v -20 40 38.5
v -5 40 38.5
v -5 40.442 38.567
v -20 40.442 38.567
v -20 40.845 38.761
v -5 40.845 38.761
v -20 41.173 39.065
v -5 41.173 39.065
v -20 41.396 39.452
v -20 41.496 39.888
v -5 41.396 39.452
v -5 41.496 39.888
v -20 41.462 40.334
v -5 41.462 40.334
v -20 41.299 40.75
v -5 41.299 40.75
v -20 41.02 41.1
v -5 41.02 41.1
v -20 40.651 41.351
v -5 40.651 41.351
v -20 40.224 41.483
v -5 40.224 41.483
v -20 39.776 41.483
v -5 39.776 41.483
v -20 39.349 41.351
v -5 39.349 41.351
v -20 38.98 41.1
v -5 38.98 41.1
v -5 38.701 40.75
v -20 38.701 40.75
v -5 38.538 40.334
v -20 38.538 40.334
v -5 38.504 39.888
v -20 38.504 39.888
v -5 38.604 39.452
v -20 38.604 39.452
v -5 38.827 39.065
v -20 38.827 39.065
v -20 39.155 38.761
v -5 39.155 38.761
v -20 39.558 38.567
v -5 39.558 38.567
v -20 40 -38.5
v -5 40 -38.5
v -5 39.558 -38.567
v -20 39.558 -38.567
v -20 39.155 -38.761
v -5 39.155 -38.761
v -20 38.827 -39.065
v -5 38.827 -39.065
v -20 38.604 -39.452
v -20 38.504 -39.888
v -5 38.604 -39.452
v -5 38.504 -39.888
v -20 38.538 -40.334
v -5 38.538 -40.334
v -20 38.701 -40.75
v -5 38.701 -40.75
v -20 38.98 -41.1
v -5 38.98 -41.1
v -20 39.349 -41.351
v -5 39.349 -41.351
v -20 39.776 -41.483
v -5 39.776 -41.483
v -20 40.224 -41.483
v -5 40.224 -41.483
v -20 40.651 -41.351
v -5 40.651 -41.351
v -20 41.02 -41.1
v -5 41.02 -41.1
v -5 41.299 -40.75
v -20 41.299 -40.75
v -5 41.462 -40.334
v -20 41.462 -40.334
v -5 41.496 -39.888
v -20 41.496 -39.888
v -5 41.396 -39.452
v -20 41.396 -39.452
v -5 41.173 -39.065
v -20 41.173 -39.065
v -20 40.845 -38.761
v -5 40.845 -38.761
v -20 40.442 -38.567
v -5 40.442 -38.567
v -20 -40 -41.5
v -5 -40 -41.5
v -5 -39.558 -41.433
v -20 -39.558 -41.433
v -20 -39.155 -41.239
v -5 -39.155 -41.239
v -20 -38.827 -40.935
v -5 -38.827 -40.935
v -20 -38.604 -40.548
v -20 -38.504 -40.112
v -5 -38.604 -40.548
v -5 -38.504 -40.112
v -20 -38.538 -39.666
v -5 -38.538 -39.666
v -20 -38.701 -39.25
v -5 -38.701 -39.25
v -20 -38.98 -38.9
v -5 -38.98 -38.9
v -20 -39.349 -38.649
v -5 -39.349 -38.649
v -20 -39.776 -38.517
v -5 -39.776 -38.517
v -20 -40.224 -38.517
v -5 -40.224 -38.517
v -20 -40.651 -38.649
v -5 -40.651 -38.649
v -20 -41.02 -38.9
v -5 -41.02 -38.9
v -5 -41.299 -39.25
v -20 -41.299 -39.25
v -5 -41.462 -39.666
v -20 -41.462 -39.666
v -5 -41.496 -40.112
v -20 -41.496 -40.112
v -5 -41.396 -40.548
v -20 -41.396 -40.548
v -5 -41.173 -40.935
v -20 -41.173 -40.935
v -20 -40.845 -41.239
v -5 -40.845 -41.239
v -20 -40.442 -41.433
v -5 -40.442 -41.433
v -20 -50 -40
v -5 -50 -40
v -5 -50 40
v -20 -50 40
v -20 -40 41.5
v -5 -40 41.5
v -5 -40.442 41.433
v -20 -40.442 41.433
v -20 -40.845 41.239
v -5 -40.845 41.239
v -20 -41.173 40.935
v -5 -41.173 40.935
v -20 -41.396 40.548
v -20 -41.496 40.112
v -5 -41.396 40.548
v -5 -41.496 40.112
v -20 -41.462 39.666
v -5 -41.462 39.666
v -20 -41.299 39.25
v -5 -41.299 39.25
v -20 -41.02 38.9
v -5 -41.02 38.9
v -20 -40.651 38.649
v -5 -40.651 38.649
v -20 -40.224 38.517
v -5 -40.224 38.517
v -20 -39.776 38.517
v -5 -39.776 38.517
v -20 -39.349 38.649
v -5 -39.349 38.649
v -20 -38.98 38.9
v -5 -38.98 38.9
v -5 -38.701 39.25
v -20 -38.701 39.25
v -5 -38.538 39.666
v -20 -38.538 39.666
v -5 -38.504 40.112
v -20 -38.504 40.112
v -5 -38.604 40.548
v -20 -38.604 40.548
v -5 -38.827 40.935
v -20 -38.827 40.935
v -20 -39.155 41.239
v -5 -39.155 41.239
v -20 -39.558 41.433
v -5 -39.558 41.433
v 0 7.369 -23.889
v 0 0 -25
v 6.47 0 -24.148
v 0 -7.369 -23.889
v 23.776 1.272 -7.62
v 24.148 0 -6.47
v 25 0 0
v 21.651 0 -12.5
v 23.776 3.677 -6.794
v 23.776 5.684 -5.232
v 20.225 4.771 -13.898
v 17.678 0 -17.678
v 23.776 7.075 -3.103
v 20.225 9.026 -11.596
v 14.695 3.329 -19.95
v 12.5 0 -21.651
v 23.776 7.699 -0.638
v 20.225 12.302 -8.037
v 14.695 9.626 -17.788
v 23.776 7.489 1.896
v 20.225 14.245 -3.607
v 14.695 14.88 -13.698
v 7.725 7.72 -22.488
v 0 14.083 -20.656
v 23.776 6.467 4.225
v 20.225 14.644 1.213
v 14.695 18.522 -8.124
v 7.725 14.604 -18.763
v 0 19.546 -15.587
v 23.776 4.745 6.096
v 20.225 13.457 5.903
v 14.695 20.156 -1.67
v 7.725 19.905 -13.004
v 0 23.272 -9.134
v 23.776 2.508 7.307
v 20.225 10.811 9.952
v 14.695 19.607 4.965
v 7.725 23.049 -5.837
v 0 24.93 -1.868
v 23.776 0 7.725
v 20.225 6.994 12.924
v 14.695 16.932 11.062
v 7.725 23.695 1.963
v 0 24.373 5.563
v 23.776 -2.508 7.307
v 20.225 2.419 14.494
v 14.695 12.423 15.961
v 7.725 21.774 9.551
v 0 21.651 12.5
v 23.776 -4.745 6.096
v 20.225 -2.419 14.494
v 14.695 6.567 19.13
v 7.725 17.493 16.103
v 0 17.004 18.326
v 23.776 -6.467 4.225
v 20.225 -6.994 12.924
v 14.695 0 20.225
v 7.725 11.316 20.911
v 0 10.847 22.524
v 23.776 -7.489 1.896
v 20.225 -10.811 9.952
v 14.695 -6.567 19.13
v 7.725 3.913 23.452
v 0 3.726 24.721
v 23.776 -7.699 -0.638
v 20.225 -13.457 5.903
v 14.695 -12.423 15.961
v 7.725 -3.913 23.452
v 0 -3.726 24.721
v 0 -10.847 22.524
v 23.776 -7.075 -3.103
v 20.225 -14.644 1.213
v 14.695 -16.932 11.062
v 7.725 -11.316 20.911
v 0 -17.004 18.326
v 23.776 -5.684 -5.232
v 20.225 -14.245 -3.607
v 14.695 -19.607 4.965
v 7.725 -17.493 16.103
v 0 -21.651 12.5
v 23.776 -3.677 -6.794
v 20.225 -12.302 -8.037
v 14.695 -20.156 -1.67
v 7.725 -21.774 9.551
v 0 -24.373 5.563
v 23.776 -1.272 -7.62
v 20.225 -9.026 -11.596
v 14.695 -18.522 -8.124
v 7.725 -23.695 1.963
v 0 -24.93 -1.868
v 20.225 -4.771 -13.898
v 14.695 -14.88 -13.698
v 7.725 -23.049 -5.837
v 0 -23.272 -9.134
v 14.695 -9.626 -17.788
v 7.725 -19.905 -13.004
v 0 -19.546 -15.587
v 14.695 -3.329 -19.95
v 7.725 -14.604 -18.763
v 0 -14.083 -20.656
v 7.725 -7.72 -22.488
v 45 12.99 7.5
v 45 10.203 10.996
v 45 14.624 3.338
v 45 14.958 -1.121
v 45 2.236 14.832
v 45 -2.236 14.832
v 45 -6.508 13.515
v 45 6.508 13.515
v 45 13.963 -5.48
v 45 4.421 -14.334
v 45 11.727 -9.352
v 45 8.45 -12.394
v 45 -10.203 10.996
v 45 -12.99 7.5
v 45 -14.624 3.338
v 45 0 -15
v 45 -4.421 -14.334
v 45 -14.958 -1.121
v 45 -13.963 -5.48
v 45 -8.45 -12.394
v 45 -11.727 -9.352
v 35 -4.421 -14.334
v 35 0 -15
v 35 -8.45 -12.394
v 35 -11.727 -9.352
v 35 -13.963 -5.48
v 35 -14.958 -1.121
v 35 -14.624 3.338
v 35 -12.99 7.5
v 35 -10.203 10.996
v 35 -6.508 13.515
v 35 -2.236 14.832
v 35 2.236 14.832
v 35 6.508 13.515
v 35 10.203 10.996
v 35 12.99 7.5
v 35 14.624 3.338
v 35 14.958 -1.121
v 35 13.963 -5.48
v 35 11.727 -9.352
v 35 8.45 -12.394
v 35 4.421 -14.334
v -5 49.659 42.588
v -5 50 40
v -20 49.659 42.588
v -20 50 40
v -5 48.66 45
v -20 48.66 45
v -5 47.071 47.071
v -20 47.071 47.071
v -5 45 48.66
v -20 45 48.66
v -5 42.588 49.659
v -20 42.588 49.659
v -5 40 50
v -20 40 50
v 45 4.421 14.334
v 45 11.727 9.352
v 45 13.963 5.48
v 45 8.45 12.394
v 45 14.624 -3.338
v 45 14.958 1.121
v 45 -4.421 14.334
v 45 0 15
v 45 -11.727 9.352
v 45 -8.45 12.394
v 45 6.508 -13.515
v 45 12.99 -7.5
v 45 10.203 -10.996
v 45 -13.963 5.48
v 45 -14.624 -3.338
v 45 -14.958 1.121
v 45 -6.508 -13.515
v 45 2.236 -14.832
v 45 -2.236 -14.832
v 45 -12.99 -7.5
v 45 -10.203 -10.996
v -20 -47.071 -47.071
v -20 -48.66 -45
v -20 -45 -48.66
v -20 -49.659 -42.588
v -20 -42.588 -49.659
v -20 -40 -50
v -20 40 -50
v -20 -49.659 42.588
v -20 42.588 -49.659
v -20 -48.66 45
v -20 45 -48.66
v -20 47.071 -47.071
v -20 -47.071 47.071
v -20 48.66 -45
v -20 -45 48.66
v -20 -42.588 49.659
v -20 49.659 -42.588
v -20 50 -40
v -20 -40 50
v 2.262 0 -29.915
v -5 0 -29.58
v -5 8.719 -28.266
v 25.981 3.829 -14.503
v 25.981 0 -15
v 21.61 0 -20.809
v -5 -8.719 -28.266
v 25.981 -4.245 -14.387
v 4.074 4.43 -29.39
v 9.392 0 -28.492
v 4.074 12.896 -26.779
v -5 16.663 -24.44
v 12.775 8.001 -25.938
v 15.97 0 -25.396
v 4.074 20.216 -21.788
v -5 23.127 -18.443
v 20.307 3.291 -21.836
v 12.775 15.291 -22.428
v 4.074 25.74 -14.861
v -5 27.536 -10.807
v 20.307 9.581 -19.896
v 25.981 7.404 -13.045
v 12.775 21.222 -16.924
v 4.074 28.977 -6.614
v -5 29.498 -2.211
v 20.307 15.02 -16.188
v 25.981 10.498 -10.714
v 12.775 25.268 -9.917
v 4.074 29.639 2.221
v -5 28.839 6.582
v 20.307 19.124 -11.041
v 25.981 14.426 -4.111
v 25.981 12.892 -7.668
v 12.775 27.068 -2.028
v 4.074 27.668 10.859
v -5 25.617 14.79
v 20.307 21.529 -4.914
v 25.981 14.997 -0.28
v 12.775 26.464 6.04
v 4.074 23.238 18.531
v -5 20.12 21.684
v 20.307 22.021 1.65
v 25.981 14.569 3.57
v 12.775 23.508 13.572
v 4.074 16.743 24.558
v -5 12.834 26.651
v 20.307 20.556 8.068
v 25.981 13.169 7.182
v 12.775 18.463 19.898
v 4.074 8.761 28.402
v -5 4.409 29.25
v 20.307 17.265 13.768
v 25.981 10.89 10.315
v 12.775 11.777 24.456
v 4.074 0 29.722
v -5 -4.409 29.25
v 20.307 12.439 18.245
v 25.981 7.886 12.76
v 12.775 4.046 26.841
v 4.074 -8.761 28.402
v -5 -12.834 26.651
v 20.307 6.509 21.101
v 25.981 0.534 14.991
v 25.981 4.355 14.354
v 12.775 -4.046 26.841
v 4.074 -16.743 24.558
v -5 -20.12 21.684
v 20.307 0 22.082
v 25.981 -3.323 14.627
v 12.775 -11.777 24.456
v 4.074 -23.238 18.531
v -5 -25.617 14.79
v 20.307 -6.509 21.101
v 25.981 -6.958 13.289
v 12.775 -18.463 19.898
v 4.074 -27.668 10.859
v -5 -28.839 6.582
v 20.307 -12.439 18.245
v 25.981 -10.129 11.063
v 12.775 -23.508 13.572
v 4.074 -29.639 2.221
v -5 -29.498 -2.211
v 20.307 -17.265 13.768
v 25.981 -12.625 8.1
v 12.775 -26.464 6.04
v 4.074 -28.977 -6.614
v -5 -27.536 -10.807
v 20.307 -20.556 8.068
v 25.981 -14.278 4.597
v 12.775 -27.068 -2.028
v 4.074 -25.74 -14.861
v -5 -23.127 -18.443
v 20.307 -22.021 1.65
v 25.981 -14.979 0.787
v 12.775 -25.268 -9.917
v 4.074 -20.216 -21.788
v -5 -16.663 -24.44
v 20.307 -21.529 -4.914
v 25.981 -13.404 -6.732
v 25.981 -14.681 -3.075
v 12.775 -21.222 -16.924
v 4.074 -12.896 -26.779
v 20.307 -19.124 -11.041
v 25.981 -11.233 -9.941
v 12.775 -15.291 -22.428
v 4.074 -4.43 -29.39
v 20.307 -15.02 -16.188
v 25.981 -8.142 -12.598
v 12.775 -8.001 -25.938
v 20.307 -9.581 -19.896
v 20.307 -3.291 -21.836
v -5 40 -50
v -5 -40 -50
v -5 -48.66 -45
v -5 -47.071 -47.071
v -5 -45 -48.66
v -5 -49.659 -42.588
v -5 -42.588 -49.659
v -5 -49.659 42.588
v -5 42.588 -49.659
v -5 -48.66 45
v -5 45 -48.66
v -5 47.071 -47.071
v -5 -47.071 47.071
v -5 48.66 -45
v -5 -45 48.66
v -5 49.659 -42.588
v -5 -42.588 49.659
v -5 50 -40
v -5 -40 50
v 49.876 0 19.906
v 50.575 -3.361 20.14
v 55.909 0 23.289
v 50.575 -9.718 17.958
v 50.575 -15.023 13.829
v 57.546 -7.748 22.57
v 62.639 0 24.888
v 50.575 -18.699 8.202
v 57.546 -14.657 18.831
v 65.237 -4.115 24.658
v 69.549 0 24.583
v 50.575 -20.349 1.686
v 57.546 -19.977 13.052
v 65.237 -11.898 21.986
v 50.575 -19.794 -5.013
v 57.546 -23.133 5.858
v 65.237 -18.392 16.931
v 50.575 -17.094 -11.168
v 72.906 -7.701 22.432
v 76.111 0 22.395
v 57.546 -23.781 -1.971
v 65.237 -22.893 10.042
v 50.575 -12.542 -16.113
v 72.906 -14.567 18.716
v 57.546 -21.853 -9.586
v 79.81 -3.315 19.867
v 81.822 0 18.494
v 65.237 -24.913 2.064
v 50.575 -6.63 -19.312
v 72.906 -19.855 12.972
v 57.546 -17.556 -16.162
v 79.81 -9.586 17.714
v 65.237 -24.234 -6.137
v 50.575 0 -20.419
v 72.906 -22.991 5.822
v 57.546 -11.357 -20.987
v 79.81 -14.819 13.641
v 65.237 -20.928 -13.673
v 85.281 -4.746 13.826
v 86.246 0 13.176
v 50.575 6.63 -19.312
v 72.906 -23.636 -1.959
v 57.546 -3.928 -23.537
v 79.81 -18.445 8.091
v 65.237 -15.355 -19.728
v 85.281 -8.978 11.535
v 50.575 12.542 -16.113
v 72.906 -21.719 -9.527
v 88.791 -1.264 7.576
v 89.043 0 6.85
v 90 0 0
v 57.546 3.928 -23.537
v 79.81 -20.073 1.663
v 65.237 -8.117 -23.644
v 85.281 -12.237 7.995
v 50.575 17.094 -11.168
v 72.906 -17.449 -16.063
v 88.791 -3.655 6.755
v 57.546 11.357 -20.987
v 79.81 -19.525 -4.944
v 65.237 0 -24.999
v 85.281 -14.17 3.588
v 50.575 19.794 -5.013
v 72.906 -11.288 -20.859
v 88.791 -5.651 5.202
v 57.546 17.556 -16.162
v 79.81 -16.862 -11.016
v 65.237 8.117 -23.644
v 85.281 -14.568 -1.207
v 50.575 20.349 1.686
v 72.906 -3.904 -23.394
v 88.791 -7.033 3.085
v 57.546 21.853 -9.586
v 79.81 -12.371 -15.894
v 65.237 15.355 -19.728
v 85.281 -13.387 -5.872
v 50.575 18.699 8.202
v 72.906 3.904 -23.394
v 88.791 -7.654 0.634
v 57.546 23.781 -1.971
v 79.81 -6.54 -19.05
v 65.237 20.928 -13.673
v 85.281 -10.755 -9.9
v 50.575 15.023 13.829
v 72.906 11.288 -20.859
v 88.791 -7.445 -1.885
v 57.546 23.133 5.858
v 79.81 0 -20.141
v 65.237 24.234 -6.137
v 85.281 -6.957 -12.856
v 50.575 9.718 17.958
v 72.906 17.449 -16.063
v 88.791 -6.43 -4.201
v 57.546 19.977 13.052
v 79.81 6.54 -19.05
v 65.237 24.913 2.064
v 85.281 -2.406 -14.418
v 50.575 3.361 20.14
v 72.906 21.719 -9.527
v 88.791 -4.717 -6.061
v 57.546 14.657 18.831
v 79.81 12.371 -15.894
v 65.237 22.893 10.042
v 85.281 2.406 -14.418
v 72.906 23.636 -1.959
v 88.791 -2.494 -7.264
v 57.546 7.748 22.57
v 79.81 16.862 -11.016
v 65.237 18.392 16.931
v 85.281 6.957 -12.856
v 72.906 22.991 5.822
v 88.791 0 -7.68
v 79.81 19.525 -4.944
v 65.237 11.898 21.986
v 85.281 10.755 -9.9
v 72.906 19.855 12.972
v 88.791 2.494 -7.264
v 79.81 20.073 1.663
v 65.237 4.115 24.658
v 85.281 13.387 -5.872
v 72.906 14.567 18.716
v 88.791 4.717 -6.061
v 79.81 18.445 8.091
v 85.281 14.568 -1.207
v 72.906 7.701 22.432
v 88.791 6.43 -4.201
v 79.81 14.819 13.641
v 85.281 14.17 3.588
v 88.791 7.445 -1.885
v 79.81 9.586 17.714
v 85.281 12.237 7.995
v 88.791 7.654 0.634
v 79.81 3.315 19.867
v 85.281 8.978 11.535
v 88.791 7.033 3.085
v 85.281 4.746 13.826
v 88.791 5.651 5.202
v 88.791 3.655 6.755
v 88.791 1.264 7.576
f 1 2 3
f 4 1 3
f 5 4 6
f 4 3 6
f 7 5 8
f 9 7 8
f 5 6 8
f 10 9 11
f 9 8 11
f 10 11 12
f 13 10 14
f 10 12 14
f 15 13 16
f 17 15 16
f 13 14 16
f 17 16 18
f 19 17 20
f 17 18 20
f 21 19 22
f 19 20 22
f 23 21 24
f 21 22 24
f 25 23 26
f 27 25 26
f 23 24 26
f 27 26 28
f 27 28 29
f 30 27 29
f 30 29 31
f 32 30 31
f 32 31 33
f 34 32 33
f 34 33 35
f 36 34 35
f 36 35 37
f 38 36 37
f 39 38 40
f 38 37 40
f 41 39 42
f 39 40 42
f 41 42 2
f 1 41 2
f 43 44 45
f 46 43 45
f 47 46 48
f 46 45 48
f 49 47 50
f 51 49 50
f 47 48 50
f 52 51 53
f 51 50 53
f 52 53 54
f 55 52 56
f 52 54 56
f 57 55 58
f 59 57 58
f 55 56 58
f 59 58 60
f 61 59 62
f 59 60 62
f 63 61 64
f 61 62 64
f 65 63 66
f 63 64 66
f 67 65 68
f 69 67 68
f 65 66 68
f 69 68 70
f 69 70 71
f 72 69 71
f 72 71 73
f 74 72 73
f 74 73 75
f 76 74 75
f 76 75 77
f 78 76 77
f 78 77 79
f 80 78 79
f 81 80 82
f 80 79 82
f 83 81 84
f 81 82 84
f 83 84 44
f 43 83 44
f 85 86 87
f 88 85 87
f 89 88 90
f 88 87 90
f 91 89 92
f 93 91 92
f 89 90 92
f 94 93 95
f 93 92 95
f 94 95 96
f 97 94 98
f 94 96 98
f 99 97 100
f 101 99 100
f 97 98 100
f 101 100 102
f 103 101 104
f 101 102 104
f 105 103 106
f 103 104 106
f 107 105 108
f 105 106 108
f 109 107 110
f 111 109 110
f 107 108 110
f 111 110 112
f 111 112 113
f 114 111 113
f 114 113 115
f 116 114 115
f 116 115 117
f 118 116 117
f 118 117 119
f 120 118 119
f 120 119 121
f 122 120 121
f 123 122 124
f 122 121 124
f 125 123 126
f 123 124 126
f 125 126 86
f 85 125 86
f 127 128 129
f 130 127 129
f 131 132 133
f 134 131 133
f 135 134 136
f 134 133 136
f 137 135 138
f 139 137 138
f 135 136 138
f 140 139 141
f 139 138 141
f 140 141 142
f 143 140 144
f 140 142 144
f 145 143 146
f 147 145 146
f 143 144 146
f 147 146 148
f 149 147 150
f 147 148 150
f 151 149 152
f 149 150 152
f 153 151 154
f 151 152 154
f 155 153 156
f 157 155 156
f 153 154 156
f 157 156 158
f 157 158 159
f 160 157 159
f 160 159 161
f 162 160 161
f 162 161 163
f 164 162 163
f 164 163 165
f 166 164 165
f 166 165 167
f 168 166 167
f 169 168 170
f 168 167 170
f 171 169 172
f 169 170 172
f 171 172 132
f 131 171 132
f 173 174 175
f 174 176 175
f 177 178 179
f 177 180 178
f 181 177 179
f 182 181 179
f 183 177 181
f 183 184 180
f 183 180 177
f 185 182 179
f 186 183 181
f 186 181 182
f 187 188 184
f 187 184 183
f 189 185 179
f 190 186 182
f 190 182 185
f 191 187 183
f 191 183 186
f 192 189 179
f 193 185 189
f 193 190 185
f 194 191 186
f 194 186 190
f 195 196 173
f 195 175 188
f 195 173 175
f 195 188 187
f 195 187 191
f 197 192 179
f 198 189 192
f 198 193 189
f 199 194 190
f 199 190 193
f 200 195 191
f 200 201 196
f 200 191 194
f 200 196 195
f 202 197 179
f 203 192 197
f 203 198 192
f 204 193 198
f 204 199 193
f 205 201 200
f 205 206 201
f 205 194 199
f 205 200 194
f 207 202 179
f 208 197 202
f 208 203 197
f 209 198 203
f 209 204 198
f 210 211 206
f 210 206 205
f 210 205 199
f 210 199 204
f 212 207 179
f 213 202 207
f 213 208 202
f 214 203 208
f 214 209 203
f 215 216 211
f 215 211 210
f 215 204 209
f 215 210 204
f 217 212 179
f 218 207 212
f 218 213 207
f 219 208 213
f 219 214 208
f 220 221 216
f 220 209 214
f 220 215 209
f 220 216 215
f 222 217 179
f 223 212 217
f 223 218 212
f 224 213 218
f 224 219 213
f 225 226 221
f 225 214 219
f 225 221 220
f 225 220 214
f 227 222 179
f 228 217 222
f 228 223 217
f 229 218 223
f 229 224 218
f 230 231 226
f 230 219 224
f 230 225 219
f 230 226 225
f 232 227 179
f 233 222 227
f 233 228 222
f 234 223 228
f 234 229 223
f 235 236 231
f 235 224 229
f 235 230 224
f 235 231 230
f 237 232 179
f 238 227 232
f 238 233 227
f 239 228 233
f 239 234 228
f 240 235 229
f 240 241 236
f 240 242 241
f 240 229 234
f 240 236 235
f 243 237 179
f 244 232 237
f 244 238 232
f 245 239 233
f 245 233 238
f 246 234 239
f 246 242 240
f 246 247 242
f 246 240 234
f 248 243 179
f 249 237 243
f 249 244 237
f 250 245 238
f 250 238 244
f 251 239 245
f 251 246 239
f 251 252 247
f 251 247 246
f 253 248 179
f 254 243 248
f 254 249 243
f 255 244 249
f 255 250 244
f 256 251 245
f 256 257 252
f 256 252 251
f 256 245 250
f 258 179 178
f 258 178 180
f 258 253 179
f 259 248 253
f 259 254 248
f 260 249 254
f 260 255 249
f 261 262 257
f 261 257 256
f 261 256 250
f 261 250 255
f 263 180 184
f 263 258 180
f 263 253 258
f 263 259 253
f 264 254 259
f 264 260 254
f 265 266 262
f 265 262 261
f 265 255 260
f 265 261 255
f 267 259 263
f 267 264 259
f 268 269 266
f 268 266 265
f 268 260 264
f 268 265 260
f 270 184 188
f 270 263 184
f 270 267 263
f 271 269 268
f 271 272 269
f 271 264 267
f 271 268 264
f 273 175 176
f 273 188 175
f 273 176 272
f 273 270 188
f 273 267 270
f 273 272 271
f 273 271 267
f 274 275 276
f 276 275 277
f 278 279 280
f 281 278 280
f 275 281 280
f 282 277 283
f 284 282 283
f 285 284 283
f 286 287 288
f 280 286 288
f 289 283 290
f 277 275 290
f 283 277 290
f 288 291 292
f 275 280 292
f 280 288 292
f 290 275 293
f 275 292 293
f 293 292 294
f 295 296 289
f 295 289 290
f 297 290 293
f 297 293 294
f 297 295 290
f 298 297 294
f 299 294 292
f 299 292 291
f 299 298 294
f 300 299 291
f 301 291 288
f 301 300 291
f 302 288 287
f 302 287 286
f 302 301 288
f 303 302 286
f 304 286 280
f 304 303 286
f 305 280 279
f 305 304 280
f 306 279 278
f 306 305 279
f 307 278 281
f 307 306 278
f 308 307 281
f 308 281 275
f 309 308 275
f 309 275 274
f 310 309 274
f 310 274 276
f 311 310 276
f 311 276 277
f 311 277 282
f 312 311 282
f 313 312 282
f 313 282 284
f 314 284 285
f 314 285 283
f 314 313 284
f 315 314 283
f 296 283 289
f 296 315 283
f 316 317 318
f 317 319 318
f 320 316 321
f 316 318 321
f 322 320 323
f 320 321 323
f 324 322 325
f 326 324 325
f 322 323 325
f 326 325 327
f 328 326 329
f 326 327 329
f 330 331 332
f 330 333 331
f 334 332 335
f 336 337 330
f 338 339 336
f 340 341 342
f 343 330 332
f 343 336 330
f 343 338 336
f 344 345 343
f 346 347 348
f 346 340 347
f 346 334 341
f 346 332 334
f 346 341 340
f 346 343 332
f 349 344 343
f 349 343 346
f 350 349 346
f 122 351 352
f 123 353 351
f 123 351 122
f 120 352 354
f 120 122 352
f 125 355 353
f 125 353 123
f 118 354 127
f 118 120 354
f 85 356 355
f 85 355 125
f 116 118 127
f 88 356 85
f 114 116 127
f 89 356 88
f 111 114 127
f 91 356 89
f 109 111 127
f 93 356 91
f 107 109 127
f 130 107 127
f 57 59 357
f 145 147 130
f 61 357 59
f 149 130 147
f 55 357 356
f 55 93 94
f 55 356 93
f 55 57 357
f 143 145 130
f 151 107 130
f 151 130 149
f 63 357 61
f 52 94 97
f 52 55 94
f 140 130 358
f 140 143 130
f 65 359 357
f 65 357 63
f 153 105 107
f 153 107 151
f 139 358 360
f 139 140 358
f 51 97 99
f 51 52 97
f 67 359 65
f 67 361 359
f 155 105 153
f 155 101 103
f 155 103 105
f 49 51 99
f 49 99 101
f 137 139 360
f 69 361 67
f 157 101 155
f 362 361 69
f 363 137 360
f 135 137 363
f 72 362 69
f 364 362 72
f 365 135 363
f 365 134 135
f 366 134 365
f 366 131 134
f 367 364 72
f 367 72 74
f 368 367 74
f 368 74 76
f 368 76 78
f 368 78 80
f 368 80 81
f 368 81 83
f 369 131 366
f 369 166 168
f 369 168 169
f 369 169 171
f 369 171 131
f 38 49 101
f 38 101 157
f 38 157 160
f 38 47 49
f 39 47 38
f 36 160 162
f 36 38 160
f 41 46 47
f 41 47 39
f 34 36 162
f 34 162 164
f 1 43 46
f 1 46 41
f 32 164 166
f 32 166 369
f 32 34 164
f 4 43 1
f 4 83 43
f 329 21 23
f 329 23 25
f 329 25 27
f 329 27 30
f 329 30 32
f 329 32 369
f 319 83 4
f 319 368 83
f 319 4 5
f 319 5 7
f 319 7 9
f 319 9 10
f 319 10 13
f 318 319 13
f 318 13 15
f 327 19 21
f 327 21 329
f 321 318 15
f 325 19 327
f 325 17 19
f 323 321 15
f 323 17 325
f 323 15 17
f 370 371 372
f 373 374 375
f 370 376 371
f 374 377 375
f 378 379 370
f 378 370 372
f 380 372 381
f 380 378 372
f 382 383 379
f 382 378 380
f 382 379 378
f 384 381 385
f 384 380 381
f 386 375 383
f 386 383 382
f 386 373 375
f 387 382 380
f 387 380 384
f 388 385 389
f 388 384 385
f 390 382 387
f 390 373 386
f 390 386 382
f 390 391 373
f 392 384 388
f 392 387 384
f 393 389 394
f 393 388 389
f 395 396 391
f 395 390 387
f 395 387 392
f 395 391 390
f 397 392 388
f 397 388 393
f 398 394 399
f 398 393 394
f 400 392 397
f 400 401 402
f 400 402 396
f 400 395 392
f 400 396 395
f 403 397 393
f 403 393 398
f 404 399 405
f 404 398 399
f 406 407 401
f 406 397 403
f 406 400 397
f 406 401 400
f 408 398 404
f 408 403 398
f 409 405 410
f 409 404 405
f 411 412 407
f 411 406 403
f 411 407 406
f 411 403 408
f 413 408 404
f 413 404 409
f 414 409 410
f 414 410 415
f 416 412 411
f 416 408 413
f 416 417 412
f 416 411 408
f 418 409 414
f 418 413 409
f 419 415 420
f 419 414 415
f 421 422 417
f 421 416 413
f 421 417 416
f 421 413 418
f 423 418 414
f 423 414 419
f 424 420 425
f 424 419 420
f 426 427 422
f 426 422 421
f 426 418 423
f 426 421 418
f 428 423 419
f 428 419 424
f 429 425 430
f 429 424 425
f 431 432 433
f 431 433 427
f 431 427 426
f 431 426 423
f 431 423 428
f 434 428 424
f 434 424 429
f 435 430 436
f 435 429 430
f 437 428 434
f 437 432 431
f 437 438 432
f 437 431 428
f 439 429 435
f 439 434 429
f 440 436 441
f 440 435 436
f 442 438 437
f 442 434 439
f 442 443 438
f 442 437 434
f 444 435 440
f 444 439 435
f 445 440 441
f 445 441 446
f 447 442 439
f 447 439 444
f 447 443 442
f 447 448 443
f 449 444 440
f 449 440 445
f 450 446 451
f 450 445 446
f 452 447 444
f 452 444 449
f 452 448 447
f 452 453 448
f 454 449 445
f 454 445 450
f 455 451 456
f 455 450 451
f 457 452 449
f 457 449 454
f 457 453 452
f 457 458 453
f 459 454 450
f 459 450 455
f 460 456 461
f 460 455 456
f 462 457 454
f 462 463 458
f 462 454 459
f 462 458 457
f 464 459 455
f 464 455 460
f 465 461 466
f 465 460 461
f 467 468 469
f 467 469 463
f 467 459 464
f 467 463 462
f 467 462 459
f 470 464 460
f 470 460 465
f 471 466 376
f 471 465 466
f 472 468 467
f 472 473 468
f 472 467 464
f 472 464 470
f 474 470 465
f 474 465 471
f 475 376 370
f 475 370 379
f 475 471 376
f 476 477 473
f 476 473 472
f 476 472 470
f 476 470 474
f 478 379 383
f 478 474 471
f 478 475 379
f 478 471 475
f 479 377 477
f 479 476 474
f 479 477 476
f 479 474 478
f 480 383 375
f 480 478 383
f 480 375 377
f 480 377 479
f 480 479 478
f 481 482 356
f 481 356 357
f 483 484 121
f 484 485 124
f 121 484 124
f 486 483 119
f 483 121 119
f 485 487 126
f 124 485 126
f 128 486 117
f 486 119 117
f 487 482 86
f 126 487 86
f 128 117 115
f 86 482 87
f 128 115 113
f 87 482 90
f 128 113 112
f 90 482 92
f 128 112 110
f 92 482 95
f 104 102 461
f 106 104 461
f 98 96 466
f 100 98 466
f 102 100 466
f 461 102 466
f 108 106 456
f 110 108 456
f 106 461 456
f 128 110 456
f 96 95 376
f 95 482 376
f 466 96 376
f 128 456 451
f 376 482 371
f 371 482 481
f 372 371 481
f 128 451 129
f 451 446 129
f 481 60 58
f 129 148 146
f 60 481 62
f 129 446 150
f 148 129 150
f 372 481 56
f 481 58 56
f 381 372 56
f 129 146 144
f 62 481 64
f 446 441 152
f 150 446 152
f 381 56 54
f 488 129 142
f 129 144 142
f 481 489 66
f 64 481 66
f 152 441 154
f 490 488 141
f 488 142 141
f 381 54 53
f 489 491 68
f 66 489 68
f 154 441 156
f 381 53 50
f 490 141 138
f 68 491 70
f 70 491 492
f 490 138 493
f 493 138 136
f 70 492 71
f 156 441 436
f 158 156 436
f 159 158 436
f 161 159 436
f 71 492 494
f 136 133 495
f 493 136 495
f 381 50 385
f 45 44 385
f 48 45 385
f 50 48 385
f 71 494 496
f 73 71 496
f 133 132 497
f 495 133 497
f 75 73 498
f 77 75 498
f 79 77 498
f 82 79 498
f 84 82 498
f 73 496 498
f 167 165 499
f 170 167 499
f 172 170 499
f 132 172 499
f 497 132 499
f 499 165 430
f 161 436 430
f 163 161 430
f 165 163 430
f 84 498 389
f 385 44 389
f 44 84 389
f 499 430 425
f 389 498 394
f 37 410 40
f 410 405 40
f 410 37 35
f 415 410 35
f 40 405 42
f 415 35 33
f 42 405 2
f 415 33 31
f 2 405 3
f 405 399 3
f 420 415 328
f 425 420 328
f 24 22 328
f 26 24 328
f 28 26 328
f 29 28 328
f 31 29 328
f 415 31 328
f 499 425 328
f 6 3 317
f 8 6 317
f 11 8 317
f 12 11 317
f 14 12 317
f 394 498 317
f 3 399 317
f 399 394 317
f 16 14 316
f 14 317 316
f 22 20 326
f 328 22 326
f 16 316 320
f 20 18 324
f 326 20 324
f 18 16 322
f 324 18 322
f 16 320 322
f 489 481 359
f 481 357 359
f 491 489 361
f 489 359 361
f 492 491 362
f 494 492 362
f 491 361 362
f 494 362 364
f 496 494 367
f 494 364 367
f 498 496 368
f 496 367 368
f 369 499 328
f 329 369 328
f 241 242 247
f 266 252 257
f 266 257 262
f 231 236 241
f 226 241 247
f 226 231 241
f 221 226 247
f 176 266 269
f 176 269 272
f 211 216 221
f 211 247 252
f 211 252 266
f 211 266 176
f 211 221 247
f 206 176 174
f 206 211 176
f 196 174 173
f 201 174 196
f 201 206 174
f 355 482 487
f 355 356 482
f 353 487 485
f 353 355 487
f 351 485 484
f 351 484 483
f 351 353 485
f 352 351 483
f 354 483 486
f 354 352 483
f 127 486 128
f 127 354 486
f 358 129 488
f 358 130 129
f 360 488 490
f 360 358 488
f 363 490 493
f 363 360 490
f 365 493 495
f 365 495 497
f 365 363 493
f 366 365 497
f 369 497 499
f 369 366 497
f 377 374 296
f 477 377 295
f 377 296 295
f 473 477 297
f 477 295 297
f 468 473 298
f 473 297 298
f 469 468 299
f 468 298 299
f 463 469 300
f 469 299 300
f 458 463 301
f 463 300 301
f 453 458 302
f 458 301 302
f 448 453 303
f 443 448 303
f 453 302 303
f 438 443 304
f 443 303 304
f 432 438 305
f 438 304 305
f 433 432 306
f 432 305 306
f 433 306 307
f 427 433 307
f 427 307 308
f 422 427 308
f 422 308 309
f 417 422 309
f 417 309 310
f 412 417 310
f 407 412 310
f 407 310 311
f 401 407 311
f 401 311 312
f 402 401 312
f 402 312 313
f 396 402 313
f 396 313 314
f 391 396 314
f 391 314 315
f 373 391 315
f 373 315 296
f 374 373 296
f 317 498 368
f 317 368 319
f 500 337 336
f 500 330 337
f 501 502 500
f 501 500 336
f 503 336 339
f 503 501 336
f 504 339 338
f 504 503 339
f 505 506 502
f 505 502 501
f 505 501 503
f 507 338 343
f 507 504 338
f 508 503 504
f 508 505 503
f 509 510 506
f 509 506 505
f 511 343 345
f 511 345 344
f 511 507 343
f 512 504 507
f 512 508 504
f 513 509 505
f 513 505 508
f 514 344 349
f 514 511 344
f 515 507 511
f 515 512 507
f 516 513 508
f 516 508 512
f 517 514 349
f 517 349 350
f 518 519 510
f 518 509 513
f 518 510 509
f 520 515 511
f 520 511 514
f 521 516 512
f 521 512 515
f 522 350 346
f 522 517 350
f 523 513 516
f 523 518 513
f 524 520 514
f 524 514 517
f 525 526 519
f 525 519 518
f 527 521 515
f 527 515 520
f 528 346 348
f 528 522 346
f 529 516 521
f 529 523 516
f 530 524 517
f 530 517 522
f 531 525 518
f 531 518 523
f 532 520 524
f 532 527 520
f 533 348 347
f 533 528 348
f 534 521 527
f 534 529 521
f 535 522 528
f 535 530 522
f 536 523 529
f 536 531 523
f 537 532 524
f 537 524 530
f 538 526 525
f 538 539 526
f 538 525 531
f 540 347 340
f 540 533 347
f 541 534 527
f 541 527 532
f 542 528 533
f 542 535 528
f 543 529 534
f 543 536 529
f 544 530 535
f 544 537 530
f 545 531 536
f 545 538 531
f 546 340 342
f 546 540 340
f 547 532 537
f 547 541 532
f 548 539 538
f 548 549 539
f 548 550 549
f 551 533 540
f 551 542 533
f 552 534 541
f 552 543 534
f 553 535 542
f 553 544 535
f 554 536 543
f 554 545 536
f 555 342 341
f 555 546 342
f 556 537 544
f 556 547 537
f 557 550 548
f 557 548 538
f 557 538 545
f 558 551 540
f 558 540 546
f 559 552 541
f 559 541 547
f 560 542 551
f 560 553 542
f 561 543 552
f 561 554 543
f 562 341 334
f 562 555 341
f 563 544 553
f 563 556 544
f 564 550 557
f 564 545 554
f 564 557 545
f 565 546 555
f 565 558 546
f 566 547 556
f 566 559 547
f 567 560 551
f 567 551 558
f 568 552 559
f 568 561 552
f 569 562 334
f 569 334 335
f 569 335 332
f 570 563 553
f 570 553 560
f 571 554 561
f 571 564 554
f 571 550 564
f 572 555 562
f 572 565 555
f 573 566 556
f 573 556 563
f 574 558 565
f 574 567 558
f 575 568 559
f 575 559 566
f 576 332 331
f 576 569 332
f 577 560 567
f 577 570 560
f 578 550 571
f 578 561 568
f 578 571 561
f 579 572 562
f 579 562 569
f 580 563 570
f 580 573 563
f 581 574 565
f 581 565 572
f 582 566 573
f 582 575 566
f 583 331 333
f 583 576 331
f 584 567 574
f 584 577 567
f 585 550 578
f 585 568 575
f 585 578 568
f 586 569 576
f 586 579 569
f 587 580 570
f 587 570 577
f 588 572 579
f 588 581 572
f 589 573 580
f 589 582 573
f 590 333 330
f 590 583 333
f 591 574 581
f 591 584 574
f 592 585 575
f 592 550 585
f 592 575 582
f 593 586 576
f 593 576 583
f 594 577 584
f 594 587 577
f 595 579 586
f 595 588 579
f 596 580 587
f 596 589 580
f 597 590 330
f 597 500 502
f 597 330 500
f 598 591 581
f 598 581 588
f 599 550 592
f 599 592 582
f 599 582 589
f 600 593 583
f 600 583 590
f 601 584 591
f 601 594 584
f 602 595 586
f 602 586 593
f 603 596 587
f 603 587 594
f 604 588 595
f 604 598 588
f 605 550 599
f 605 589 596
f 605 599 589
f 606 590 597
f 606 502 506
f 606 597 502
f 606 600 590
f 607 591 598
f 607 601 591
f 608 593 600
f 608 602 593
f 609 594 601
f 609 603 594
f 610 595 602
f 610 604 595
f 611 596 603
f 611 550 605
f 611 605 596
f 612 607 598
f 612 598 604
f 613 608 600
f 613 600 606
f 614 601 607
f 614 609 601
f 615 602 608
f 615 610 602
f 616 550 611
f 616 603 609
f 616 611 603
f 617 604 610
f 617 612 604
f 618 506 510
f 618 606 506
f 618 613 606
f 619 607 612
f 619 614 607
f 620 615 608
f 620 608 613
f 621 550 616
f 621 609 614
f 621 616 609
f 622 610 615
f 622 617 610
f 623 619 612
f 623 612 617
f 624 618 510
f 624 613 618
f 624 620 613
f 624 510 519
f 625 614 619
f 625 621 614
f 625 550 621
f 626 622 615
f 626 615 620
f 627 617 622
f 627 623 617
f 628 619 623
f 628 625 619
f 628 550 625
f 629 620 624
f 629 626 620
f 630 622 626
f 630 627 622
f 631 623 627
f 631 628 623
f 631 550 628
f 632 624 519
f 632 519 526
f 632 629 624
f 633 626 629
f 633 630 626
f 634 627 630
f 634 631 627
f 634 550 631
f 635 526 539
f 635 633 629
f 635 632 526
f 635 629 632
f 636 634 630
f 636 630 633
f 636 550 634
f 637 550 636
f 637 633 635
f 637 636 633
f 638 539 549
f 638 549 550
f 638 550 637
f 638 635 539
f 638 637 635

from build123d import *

# Parameters (mm, degrees)
SALIENTE_EXTRUIR2_START             = -40
CROQUIS4_R                          = 15
SALIENTE_EXTRUIR2_DEPTH             = 10
SALIENTE_EXTRUIR2_DIRECTION_2_REACH = 97
CROQUIS6_W                          = 100
CROQUIS6_H                          = 100
SALIENTE_EXTRUIR3_DEPTH             = 15
REDONDEO1_R                         = 10
CROQUIS7_R                          = 1.5
CORTAR_EXTRUIR1_DEPTH               = 15


with BuildPart() as part:
    # Croquis2 → Revolución-Lámina1 (revolve)
    with BuildSketch(Plane(origin=(0, 0, 0), x_dir=(1, 0, 0), z_dir=(0, 1, 0))):
        with BuildLine():
            ThreePointArc((25, 0), (17.67766953, 17.67766953), (0, 25))
            Line((0, 25), (0, 0))
            Line((0, 0), (-5, 0))
            Line((-5, 0), (-5, 29.580398915))
            ThreePointArc((-5, 29.580398915), (19.364916731, 22.912878475), (30, 0))
            Line((30, 0), (25, 0))
        make_face()
    revolve(axis=Axis((0, 0, 0), (1, 0, 0)))

    # Croquis4 → Saliente-Extruir2 (add)
    with BuildSketch(Plane.ZY.offset(5).offset(SALIENTE_EXTRUIR2_START)):
        with Locations(Location((0, 0, 0), (0, 0, 180))):
            Circle(CROQUIS4_R)
    extrude(amount=-SALIENTE_EXTRUIR2_DEPTH)

    # Croquis4 → Saliente-Extruir2 direction 2 (add, up to next)
    with BuildSketch(Plane.ZY.offset(5).offset(SALIENTE_EXTRUIR2_START), mode=Mode.PRIVATE) as saliente_extruir2_direction_2_sk1:
        with Locations(Location((0, 0, 0), (0, 0, 180))):
            Circle(CROQUIS4_R)
    saliente_extruir2_direction_2_tool1 = extrude(saliente_extruir2_direction_2_sk1.sketch, amount=SALIENTE_EXTRUIR2_DIRECTION_2_REACH, mode=Mode.PRIVATE) - part.part
    add(saliente_extruir2_direction_2_tool1.solids().sort_by_distance((35, 0, 0))[0])

    # Croquis6 → Saliente-Extruir3 (add)
    with BuildSketch(Plane.ZY.offset(5)):
        Rectangle(CROQUIS6_W, CROQUIS6_H)
    extrude(amount=SALIENTE_EXTRUIR3_DEPTH)

    # Redondeo1
    redondeo1_edges = [part.edges().sort_by_distance(p)[0] for p in [
        (-12.5, -50, 50),
        (-12.5, 50, 50),
        (-12.5, 50, -50),
        (-12.5, -50, -50),
    ]]
    fillet(redondeo1_edges, radius=REDONDEO1_R)

    # Croquis7 → Cortar-Extruir1 (cut)
    with BuildSketch(Plane(origin=(-5, 0, 0), x_dir=(0, 0, -1), z_dir=(1, 0, 0))):
        with Locations((-40, 40)):
            Circle(CROQUIS7_R)
        with Locations(Location((40, 40, 0), (0, 0, 180))):
            Circle(CROQUIS7_R)
        with Locations((40, -40)):
            Circle(CROQUIS7_R)
        with Locations(Location((-40, -40, 0), (0, 0, 180))):
            Circle(CROQUIS7_R)
    extrude(amount=-CORTAR_EXTRUIR1_DEPTH, mode=Mode.SUBTRACT)


with BuildPart() as body_2:
    # Croquis5 → Revolución1 (revolve)
    with BuildSketch(Plane(origin=(0, 0, 0), x_dir=(1, 0, 0), z_dir=(0, 1, 0)), mode=Mode.PRIVATE) as revoluci_n1_sk:
        with BuildLine():
            Line((45, 0), (45, 15))
            ThreePointArc((45, 15), (72.90569415, 23.717082451), (90, 0))
            Line((90, 0), (45, 0))
        make_face()
    revolve(revoluci_n1_sk.sketch.rotate(Axis((45, 0, 0), (1, 0, 0)), 180), axis=Axis((45, 0, 0), (1, 0, 0)))


solid = Compound([part.part, body_2.part])
